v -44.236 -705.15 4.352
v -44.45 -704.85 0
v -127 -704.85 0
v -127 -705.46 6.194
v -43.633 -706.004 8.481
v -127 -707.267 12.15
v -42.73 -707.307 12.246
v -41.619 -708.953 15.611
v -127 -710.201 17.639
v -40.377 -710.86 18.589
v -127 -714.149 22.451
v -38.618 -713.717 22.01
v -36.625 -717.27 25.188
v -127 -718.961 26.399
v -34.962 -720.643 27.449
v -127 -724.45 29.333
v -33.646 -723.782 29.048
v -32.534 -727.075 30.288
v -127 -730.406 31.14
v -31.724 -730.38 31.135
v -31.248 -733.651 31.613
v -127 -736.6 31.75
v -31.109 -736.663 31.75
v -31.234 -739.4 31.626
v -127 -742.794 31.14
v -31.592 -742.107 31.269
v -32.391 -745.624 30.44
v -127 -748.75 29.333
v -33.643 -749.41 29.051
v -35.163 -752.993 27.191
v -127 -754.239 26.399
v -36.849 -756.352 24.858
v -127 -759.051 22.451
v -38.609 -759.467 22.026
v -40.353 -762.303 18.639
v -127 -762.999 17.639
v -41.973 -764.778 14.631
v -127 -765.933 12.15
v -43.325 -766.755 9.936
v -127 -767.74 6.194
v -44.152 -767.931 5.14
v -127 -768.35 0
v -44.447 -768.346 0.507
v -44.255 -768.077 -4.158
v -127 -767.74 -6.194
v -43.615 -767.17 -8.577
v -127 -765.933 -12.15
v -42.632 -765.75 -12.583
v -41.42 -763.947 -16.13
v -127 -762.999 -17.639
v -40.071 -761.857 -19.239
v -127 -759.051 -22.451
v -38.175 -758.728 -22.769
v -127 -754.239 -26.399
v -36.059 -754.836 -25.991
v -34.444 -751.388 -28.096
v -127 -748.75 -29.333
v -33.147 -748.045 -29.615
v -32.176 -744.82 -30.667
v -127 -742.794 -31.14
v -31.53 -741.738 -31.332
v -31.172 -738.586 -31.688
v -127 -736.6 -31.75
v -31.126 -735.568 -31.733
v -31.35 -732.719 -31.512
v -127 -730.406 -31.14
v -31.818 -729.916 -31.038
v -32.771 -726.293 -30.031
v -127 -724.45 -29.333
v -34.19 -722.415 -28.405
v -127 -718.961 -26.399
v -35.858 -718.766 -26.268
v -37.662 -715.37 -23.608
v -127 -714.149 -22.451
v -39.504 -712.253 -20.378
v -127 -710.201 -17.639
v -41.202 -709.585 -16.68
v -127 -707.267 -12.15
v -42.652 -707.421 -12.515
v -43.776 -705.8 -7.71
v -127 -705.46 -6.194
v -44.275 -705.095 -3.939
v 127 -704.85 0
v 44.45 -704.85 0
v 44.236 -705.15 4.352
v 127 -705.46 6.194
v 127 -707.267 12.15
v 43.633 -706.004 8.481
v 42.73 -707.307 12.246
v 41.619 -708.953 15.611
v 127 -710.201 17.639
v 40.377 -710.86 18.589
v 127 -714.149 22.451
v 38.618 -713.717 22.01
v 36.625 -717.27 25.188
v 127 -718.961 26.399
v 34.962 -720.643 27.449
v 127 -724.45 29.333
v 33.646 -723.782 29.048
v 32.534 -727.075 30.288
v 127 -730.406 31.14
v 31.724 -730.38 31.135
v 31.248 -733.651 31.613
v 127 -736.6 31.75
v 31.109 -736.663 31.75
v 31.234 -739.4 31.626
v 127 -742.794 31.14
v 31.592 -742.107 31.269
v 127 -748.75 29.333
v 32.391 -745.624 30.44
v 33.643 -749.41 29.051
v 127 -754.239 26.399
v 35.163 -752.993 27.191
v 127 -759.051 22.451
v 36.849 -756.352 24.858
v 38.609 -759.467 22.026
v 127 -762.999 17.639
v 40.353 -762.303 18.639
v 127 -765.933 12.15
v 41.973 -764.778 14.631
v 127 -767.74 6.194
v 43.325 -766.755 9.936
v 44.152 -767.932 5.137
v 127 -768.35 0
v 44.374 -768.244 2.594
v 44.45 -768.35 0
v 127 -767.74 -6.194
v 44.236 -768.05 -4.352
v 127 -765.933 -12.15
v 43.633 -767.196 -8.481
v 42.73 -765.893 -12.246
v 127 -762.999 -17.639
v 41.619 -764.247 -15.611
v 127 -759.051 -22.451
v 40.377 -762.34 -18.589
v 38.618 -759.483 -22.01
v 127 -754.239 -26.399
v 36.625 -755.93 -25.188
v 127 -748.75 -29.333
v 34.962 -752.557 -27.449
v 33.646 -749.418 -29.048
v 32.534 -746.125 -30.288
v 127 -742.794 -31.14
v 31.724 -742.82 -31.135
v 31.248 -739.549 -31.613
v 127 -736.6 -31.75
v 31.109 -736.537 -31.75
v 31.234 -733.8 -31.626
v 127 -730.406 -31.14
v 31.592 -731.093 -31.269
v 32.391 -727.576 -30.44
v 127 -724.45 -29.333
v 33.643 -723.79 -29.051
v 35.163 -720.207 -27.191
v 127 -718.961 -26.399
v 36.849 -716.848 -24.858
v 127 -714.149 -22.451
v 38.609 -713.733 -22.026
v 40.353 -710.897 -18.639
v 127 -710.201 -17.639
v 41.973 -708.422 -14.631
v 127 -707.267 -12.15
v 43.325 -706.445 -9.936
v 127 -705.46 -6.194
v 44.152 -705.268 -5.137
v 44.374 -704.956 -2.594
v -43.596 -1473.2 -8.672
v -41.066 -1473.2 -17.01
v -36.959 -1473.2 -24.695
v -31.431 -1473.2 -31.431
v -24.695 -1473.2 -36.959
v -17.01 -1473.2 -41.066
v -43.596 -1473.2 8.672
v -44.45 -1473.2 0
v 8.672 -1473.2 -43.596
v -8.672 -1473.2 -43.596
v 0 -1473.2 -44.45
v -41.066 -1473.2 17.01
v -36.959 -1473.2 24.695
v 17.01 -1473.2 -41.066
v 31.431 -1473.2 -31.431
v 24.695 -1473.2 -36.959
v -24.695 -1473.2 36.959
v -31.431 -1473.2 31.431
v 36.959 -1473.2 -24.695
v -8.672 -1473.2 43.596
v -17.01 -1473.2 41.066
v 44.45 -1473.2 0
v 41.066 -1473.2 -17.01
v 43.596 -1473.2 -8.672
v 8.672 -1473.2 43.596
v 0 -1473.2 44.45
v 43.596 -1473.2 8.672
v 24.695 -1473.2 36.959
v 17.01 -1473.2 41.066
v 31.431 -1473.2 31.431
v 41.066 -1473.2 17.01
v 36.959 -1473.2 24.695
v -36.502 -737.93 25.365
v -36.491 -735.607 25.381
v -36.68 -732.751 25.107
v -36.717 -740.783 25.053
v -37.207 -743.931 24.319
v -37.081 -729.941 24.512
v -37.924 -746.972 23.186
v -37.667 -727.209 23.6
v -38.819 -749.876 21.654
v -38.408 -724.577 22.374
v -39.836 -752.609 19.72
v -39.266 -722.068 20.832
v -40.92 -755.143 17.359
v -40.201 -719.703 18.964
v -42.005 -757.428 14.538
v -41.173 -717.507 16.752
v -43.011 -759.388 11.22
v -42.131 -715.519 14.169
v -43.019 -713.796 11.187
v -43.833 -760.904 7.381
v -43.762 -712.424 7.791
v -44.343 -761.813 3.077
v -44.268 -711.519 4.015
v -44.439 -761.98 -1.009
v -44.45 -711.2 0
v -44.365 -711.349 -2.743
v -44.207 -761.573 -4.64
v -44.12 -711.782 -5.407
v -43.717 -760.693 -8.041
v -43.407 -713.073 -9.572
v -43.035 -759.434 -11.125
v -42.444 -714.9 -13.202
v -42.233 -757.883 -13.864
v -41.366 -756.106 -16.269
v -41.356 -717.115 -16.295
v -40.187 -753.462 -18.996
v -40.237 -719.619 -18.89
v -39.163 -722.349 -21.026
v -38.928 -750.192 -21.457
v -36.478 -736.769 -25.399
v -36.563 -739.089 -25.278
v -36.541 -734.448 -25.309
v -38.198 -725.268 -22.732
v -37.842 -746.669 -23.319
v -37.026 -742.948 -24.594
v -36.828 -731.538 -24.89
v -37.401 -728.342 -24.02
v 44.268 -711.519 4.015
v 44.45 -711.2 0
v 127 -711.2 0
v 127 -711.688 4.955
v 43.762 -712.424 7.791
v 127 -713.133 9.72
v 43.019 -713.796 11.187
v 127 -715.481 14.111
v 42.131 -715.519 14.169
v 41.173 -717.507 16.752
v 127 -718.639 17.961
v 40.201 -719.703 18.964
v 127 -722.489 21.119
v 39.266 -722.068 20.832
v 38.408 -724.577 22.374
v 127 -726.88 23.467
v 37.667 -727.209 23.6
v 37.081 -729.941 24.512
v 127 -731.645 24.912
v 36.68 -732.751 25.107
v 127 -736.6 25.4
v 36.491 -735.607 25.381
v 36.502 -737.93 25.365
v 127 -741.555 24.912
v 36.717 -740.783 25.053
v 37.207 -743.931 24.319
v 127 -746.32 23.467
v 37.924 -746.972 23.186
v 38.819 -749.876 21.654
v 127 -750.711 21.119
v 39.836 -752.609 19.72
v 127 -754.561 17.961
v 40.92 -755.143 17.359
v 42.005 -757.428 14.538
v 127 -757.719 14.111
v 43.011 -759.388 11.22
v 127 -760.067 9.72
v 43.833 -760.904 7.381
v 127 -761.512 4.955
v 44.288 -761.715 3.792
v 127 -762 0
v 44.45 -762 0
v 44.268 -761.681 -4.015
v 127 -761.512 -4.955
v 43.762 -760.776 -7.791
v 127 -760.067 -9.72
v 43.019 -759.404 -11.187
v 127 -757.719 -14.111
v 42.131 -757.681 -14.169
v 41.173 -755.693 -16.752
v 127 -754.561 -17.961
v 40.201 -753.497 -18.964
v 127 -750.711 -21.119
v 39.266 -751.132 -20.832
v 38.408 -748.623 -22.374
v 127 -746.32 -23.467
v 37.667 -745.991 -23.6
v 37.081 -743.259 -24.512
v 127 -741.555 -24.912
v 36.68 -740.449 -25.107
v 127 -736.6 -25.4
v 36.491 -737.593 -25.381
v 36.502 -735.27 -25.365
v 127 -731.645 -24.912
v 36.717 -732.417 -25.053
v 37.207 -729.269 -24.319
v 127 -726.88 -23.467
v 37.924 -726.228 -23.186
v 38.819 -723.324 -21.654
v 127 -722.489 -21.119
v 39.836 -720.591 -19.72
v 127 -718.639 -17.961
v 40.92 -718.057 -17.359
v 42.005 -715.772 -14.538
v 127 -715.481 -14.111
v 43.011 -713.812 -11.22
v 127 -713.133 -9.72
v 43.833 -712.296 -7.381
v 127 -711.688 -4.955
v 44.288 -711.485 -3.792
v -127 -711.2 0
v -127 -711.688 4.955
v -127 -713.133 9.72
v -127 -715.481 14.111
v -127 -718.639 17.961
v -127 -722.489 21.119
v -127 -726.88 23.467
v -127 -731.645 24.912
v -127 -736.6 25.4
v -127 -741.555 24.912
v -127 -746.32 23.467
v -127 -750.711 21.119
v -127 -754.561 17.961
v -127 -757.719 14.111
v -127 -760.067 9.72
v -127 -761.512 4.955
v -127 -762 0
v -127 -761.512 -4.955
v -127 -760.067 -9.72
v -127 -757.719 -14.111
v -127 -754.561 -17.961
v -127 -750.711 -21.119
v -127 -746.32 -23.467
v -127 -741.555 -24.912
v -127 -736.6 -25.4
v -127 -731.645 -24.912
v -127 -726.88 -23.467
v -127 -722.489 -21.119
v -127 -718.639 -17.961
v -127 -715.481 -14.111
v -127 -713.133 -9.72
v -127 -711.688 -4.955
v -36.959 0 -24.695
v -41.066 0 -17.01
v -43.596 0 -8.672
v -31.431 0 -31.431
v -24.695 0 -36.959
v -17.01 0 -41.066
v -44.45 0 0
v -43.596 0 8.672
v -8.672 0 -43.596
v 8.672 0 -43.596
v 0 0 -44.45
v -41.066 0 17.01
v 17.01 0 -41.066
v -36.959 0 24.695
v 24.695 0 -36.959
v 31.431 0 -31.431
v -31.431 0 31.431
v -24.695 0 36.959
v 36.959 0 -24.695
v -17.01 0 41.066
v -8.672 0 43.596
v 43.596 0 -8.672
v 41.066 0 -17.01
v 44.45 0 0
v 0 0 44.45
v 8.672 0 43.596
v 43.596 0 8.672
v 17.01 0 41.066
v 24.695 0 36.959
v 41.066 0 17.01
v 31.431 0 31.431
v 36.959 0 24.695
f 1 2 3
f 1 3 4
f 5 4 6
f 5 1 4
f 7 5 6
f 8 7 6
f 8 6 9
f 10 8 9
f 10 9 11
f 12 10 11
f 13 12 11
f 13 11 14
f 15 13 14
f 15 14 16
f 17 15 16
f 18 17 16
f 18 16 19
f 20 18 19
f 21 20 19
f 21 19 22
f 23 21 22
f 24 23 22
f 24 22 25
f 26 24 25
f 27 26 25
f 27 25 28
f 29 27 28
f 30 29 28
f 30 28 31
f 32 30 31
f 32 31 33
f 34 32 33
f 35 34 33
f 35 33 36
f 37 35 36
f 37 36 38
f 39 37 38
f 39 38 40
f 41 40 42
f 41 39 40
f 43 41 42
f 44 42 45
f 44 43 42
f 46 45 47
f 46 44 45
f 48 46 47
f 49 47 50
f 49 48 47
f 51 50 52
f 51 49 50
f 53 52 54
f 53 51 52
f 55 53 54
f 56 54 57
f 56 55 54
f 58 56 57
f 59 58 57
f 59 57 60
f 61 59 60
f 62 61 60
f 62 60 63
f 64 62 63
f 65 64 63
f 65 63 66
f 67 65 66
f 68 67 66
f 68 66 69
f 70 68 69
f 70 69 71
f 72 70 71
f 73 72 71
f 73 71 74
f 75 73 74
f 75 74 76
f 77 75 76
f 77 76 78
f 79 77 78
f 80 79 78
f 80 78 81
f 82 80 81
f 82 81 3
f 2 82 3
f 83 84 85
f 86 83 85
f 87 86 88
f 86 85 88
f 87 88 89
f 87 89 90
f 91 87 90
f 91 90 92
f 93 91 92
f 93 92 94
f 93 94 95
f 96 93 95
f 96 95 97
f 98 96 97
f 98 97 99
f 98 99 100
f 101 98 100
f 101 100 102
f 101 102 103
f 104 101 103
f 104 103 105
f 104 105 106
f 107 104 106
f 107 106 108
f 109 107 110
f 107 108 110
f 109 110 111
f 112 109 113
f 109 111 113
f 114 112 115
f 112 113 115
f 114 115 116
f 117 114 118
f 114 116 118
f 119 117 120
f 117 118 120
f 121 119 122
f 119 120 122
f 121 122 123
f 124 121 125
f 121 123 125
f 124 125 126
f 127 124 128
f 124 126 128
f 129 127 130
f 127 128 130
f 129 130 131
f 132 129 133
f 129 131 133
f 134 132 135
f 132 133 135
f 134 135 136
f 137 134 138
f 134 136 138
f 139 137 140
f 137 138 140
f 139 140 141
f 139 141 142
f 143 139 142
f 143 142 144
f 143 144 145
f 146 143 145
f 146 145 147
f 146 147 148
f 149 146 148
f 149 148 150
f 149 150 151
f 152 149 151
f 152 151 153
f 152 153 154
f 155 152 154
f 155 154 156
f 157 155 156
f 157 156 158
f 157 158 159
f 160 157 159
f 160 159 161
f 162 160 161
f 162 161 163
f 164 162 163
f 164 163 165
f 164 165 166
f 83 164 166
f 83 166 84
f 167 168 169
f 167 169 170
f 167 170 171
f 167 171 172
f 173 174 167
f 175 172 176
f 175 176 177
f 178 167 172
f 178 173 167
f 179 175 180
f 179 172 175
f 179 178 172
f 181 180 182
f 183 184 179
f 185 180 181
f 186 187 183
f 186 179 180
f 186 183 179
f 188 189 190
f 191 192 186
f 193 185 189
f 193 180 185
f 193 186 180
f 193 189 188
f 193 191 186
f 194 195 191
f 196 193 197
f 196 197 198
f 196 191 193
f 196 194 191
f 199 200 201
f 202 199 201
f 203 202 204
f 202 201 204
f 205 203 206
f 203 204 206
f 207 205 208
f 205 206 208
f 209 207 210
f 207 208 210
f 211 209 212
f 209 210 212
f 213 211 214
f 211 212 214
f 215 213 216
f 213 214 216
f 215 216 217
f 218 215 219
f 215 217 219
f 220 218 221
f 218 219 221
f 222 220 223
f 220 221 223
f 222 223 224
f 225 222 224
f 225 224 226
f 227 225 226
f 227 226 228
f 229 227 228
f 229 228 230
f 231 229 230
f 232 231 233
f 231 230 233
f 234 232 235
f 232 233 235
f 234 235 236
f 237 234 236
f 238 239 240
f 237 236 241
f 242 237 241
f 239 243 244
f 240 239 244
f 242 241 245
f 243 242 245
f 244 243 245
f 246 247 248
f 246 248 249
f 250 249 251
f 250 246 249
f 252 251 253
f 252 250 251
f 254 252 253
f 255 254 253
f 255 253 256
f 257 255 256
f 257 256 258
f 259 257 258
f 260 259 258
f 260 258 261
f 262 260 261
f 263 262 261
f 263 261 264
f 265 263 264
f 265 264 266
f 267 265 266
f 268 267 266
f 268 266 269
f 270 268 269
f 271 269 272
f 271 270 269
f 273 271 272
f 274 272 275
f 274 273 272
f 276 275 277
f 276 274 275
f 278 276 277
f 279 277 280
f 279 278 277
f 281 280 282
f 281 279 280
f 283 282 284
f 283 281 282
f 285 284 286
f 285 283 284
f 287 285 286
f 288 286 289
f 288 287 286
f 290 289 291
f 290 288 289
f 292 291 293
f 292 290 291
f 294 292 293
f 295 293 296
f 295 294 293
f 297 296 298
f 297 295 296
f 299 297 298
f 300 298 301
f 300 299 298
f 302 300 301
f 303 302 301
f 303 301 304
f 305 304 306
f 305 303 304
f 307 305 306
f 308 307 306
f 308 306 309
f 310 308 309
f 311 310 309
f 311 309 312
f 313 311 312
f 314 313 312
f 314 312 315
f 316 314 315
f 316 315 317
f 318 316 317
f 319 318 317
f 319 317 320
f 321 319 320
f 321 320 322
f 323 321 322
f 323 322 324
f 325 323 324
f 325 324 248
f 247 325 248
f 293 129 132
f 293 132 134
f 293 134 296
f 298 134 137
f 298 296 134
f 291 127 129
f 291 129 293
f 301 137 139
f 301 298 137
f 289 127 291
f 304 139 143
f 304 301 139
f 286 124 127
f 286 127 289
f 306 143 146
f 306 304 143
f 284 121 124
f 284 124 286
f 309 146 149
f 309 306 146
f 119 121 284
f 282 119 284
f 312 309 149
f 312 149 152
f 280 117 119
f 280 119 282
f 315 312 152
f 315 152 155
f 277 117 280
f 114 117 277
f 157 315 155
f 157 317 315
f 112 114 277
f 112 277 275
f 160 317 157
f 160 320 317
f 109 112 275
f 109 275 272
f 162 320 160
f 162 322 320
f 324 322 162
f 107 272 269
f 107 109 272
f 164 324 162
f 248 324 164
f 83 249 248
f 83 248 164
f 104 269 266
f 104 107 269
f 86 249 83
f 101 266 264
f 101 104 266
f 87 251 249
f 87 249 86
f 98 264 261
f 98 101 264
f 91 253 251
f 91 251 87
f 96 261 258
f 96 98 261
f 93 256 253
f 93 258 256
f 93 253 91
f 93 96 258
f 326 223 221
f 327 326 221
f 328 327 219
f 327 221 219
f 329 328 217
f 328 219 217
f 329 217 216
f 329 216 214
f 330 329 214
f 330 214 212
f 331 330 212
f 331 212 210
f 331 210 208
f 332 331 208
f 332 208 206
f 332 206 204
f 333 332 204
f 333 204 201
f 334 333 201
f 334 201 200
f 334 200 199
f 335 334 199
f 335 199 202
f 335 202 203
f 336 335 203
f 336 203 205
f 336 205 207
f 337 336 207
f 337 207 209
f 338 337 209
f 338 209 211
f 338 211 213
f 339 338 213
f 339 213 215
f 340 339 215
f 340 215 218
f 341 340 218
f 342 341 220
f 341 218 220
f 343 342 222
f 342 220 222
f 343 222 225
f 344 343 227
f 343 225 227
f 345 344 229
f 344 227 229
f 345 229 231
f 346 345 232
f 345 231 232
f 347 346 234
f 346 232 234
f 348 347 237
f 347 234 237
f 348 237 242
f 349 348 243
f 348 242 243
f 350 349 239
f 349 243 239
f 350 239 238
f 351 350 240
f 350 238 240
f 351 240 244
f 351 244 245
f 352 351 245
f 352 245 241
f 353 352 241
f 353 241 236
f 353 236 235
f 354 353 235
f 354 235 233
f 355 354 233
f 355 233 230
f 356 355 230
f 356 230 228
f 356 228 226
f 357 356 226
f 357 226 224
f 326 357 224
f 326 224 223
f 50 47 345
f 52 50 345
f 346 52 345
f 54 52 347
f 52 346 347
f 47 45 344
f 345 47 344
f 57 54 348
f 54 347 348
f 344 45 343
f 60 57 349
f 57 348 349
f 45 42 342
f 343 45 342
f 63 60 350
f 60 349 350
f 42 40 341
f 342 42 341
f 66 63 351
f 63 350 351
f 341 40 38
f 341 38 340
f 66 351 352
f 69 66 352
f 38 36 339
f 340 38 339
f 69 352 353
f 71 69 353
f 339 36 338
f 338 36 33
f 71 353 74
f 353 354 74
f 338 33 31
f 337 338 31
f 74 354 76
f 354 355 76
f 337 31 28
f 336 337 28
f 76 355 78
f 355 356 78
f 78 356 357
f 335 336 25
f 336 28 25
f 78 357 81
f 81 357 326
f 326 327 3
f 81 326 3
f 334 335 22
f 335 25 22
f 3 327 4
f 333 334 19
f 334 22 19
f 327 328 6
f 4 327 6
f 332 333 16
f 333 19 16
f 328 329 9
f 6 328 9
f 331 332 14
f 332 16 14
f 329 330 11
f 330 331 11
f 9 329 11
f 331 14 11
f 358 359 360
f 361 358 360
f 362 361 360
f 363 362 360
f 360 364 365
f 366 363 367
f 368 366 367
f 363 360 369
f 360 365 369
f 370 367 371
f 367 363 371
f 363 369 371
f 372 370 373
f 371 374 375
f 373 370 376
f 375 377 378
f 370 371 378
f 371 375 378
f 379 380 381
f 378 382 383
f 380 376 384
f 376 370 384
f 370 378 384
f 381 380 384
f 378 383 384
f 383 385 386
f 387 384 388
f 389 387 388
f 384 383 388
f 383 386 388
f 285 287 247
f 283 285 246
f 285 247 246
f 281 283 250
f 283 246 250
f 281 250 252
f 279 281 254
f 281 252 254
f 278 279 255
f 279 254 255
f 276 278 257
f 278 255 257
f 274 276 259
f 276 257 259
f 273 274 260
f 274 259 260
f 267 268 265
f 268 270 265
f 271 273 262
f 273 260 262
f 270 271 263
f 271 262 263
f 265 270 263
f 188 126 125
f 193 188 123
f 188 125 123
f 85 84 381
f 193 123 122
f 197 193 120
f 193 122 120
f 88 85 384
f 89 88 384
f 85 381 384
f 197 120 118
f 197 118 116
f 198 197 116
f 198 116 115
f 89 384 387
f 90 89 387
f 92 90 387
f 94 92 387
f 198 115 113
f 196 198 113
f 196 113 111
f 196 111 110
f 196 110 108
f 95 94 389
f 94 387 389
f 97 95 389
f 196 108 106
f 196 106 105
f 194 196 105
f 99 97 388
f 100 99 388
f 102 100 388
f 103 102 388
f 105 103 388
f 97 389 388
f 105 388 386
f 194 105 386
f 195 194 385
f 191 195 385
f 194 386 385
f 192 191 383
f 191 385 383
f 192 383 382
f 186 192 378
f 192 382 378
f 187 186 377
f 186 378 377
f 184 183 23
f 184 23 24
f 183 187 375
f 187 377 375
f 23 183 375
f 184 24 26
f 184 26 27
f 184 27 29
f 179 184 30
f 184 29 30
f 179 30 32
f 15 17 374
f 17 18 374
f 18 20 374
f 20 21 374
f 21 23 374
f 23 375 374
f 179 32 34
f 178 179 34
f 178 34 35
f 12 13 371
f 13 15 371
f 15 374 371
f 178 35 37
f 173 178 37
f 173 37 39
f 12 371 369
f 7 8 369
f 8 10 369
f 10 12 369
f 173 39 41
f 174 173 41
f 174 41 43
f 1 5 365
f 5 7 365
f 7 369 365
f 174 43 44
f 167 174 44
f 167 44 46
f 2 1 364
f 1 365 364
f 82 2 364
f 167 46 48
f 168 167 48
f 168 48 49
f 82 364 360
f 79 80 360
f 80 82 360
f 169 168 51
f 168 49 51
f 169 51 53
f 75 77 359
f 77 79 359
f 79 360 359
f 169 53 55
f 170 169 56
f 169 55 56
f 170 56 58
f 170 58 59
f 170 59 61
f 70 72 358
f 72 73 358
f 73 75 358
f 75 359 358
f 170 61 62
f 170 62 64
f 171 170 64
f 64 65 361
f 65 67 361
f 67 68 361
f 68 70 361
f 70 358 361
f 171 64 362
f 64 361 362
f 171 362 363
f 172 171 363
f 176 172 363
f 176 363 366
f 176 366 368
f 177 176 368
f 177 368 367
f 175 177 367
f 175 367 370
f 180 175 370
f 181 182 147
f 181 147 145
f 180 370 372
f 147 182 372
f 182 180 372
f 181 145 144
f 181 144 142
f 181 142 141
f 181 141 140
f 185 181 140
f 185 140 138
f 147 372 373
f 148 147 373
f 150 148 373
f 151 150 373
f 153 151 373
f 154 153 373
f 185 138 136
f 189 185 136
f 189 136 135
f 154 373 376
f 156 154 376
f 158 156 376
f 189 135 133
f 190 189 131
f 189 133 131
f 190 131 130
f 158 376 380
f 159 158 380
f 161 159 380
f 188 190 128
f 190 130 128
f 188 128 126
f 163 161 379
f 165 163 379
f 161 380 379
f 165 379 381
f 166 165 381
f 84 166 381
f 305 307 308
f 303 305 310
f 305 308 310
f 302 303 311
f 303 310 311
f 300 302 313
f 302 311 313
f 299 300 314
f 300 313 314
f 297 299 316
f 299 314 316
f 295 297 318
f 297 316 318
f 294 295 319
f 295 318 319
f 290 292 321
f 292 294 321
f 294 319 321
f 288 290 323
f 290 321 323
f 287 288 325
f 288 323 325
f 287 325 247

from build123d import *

# Parameters (mm, degrees)
F0_R          = 44.45
F1_DEPTH      = 25.4
F2_DEPTH      = 1473.2
F3_R          = 31.75
F3_R_2        = 25.4
F4_DEPTH      = 127
F4_DEPTH_BACK = 127


with BuildPart() as f1:
    # F0 (on Front) → F1 (new body)
    with BuildSketch(Plane.XZ):
        Circle(F0_R)
    extrude(amount=F1_DEPTH)

    # F0 (on Front) → F2 (join)
    with BuildSketch(Plane.XZ):
        Circle(F0_R)
    extrude(amount=F2_DEPTH)

    # F3 (on Right) → F4 (join, two sides)
    with BuildSketch(Plane.YZ) as f4_sk:
        with Locations((-736.6, 0)):
            Circle(F3_R)
        with Locations((-736.6, 0)):
            Circle(F3_R_2, mode=Mode.SUBTRACT)
    extrude(amount=F4_DEPTH)
    extrude(f4_sk.sketch, amount=-F4_DEPTH_BACK)


solid = f1.part
